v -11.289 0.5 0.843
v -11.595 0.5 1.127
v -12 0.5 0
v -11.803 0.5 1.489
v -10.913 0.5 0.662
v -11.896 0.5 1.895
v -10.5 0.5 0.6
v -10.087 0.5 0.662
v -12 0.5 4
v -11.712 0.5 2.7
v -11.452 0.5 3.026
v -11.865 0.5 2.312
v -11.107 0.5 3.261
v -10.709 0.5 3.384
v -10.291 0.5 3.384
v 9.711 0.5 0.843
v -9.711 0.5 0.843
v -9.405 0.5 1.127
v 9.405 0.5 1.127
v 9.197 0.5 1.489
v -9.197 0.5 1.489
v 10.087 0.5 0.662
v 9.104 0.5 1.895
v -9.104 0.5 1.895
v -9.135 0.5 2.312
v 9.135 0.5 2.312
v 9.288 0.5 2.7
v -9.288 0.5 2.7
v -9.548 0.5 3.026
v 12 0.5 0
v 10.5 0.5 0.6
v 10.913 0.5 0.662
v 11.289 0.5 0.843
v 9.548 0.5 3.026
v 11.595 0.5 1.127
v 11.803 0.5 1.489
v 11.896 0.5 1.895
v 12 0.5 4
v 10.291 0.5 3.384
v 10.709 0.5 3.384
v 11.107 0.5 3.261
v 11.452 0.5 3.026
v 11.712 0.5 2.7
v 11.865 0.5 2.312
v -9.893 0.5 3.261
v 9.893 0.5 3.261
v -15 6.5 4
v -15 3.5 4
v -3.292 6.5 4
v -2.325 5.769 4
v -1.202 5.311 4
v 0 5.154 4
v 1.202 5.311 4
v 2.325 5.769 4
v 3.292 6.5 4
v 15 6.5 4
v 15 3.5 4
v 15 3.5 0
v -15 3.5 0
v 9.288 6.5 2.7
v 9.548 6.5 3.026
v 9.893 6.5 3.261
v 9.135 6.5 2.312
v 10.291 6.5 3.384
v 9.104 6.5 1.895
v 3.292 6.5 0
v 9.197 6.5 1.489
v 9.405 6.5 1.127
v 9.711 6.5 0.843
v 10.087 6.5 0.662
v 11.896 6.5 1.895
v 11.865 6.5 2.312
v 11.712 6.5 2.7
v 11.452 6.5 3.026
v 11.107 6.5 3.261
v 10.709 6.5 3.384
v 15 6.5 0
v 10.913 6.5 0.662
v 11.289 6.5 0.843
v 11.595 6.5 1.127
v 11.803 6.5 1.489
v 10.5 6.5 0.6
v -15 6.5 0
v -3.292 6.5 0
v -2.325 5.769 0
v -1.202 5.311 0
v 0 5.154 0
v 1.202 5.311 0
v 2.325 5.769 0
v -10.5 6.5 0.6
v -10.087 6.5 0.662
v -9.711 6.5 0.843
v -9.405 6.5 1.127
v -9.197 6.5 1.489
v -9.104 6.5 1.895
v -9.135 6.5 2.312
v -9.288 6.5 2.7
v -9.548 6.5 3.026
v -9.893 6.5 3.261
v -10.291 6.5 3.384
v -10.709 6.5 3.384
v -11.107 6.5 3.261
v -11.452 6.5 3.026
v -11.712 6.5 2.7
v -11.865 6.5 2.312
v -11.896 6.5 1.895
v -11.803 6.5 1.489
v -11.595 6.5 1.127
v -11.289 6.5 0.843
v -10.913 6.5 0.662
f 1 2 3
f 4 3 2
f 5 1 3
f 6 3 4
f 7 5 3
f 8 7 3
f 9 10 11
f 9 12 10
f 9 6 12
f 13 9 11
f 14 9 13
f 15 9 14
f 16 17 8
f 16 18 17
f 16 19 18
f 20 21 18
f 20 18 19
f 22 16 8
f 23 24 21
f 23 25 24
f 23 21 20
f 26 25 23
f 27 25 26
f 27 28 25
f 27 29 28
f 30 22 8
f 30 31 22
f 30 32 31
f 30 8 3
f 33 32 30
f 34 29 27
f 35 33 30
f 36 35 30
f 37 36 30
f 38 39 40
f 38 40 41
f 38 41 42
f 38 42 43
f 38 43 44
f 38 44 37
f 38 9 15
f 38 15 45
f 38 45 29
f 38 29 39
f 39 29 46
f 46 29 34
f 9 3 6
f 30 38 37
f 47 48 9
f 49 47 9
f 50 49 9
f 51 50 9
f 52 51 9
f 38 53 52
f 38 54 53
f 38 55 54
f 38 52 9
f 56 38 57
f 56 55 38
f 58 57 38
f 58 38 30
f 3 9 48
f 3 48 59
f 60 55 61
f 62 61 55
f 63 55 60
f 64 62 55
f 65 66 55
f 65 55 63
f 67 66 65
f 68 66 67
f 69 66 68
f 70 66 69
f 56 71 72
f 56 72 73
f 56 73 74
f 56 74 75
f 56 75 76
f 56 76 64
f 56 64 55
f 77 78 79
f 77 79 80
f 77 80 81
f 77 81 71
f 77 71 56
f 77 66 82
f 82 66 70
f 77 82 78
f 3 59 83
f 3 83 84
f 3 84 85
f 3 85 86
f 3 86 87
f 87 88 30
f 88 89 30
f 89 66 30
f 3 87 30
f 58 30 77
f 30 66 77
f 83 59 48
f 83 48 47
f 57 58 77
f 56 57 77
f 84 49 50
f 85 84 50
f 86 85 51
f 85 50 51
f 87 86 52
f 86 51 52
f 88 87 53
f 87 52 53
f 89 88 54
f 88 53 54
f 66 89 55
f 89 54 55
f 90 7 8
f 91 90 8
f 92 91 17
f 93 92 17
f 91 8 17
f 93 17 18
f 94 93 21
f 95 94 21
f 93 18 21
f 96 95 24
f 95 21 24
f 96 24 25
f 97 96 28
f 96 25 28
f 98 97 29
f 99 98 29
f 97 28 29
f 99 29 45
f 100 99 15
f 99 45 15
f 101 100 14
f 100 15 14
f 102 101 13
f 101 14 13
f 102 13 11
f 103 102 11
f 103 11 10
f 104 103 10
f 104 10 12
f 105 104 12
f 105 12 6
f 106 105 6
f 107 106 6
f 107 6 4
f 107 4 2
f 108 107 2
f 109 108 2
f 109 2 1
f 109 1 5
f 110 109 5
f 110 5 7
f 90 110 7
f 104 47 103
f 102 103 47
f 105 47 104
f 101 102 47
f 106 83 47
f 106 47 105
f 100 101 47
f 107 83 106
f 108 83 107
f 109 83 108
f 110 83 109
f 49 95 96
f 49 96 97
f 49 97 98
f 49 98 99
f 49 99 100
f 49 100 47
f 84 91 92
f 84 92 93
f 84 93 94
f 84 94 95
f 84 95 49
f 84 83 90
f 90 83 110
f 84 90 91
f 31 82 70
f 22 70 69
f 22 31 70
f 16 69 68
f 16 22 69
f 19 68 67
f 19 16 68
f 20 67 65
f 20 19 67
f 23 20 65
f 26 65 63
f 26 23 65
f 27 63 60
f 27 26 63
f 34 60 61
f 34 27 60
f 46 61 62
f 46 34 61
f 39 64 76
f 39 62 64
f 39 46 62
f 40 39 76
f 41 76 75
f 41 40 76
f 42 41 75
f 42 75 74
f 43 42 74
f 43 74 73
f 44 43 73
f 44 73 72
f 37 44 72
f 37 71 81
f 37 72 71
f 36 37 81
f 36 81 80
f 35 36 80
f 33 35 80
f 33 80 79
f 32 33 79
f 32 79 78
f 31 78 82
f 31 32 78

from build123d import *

# Parameters (mm, degrees)
SKETCH_1_W             = 30
SKETCH_1_H             = 13
EXTRUDE_1_DEPTH        = 4
SKETCH_3_R             = 4.7
CUT_EXTRUDE_2_DEPTH    = 10
HOLE_WIZARD_M2_1_D     = 1.6
HOLE_WIZARD_M2_1_DEPTH = 6
HOLE_WIZARD_M2_1_TIP   = 0.480688495
SKETCH_7_W             = 30
SKETCH_7_H             = 7
CUT_EXTRUDE_3_DEPTH    = 10
CHAMFER_1_SIZE         = 3
SKETCH_8_R             = 1.4
CUT_EXTRUDE_4_DEPTH    = 10


with BuildPart() as part:
    # 草图1 → 凸台-拉伸1 (new body)
    with BuildSketch(Plane.XY):
        Rectangle(SKETCH_1_W, SKETCH_1_H)
    extrude(amount=EXTRUDE_1_DEPTH)

    # 草图3 → 切除-拉伸2 (cut)
    with BuildSketch(Plane.XY.offset(4)):
        with Locations((0, 9.854101966)):
            Circle(SKETCH_3_R)
    extrude(amount=-CUT_EXTRUDE_2_DEPTH, mode=Mode.SUBTRACT)

    # M2 螺纹孔1
    with Locations(Plane(origin=(0, -0.645898034, 4), x_dir=(1, 0, 0), z_dir=(0, 0, 1))):
        with Locations((0, 0)):
            Hole(HOLE_WIZARD_M2_1_D / 2, depth=HOLE_WIZARD_M2_1_DEPTH)
            with Locations((0, 0, -(HOLE_WIZARD_M2_1_DEPTH + HOLE_WIZARD_M2_1_TIP / 2))):  # 118° drill point
                Cone(0, HOLE_WIZARD_M2_1_D / 2, HOLE_WIZARD_M2_1_TIP, mode=Mode.SUBTRACT)

    # 草图7 → 切除-拉伸3 (cut)
    with BuildSketch(Plane.XY.offset(4)):
        with Locations((0, -3)):
            Rectangle(SKETCH_7_W, SKETCH_7_H)
    extrude(amount=-CUT_EXTRUDE_3_DEPTH, mode=Mode.SUBTRACT)

    # 倒角1
    chamfer_1_edges = [part.edges().sort_by_distance(p)[0] for p in [
        (-15, 0.5, 2),
        (15, 0.5, 2),
    ]]
    chamfer(chamfer_1_edges, length=CHAMFER_1_SIZE)

    # 草图8 → 切除-拉伸4 (cut)
    with BuildSketch(Plane.XZ.offset(-0.5)):
        with Locations(Location((-10.5, 2, 0), (0, 0, 270))):
            Circle(SKETCH_8_R)
    cut_extrude_4 = extrude(amount=-CUT_EXTRUDE_4_DEPTH, mode=Mode.SUBTRACT)

    # 镜向1: 切除-拉伸4 across plane
    add(cut_extrude_4.mirror(Plane(origin=(0, 0, 0), x_dir=(0, 0, 1), z_dir=(1, 0, 0))), mode=Mode.SUBTRACT)


solid = part.part
